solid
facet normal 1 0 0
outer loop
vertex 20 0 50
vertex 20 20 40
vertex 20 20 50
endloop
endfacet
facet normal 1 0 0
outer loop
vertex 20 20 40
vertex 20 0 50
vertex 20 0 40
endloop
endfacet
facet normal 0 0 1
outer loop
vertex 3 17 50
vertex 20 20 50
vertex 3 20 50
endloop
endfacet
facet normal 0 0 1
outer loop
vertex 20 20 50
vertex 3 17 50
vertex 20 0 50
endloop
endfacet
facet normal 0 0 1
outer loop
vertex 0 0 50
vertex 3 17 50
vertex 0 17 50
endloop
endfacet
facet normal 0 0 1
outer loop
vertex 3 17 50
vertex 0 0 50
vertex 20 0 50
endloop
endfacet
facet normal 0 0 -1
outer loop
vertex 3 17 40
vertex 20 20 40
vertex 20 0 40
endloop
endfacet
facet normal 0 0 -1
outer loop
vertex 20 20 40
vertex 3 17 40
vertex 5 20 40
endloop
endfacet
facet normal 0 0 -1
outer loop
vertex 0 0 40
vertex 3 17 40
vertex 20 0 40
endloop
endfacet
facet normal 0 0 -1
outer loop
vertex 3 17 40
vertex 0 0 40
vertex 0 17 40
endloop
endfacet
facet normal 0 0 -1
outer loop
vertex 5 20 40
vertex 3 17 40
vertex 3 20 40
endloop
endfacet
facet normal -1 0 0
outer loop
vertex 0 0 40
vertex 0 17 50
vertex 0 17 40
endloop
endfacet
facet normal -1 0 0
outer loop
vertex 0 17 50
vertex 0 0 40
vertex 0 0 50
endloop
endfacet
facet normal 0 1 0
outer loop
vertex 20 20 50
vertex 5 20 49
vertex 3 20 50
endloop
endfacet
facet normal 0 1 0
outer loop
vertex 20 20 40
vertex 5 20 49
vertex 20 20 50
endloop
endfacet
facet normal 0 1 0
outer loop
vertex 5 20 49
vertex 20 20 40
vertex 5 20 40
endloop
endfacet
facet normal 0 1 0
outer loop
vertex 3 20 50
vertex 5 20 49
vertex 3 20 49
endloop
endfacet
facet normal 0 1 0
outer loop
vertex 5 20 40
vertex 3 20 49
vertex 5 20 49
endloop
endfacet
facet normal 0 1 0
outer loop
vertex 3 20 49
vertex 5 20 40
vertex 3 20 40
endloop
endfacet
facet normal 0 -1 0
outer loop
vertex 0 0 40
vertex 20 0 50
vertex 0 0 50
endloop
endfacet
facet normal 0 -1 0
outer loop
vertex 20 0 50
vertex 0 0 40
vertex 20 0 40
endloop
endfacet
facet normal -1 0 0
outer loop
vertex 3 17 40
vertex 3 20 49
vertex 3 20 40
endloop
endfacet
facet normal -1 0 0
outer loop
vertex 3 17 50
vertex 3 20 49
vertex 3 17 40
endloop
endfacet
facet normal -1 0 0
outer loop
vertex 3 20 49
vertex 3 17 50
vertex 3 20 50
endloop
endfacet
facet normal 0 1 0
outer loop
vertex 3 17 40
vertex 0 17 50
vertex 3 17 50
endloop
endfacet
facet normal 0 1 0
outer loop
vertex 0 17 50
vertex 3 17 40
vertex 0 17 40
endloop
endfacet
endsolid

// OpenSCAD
// Parameters
hook_thickness = 3; // The thickness of the hook
hook_height = 50;   // The overall height of the hook
hook_width = 20;    // The width of the hook
hook_curve = 20;    // The curve of the hook (how far it extends outward)
hook_base = 10;     // The thickness of the base that attaches to the wall

difference()
{
    // Base of the hook
    translate([ 0, 0, hook_height - hook_base ]) cube([ hook_width, hook_curve, hook_base ]);

    // Vertical part of the hook
    translate([ 0, hook_curve - hook_thickness, 0 ]) cube([ hook_thickness, hook_thickness, hook_height ]);

    // Curved part of the hook
    translate([ 0, 0, hook_height - hook_base - hook_thickness ]) rotate([ 0, 0, 180 ])
        rotate_extrude(convexity = 10, $fn = 100) translate([ hook_thickness, 0, 0 ])
            circle(r = hook_curve - hook_thickness);

    // Subtracting a small inner portion to hollow the hook
    // Vertical part
    translate([ hook_thickness, hook_curve, 0 ]) cube([ hook_thickness - 1, hook_thickness - 1, hook_height - 1 ]);

    // Curved part
    translate([ 0, 0, hook_height - hook_base - hook_thickness ]) rotate([ 0, 0, 180 ])
        rotate_extrude(convexity = 10, $fn = 100) translate([ hook_thickness + 1, 0, 0 ])
            circle(r = hook_curve - hook_thickness);
}
